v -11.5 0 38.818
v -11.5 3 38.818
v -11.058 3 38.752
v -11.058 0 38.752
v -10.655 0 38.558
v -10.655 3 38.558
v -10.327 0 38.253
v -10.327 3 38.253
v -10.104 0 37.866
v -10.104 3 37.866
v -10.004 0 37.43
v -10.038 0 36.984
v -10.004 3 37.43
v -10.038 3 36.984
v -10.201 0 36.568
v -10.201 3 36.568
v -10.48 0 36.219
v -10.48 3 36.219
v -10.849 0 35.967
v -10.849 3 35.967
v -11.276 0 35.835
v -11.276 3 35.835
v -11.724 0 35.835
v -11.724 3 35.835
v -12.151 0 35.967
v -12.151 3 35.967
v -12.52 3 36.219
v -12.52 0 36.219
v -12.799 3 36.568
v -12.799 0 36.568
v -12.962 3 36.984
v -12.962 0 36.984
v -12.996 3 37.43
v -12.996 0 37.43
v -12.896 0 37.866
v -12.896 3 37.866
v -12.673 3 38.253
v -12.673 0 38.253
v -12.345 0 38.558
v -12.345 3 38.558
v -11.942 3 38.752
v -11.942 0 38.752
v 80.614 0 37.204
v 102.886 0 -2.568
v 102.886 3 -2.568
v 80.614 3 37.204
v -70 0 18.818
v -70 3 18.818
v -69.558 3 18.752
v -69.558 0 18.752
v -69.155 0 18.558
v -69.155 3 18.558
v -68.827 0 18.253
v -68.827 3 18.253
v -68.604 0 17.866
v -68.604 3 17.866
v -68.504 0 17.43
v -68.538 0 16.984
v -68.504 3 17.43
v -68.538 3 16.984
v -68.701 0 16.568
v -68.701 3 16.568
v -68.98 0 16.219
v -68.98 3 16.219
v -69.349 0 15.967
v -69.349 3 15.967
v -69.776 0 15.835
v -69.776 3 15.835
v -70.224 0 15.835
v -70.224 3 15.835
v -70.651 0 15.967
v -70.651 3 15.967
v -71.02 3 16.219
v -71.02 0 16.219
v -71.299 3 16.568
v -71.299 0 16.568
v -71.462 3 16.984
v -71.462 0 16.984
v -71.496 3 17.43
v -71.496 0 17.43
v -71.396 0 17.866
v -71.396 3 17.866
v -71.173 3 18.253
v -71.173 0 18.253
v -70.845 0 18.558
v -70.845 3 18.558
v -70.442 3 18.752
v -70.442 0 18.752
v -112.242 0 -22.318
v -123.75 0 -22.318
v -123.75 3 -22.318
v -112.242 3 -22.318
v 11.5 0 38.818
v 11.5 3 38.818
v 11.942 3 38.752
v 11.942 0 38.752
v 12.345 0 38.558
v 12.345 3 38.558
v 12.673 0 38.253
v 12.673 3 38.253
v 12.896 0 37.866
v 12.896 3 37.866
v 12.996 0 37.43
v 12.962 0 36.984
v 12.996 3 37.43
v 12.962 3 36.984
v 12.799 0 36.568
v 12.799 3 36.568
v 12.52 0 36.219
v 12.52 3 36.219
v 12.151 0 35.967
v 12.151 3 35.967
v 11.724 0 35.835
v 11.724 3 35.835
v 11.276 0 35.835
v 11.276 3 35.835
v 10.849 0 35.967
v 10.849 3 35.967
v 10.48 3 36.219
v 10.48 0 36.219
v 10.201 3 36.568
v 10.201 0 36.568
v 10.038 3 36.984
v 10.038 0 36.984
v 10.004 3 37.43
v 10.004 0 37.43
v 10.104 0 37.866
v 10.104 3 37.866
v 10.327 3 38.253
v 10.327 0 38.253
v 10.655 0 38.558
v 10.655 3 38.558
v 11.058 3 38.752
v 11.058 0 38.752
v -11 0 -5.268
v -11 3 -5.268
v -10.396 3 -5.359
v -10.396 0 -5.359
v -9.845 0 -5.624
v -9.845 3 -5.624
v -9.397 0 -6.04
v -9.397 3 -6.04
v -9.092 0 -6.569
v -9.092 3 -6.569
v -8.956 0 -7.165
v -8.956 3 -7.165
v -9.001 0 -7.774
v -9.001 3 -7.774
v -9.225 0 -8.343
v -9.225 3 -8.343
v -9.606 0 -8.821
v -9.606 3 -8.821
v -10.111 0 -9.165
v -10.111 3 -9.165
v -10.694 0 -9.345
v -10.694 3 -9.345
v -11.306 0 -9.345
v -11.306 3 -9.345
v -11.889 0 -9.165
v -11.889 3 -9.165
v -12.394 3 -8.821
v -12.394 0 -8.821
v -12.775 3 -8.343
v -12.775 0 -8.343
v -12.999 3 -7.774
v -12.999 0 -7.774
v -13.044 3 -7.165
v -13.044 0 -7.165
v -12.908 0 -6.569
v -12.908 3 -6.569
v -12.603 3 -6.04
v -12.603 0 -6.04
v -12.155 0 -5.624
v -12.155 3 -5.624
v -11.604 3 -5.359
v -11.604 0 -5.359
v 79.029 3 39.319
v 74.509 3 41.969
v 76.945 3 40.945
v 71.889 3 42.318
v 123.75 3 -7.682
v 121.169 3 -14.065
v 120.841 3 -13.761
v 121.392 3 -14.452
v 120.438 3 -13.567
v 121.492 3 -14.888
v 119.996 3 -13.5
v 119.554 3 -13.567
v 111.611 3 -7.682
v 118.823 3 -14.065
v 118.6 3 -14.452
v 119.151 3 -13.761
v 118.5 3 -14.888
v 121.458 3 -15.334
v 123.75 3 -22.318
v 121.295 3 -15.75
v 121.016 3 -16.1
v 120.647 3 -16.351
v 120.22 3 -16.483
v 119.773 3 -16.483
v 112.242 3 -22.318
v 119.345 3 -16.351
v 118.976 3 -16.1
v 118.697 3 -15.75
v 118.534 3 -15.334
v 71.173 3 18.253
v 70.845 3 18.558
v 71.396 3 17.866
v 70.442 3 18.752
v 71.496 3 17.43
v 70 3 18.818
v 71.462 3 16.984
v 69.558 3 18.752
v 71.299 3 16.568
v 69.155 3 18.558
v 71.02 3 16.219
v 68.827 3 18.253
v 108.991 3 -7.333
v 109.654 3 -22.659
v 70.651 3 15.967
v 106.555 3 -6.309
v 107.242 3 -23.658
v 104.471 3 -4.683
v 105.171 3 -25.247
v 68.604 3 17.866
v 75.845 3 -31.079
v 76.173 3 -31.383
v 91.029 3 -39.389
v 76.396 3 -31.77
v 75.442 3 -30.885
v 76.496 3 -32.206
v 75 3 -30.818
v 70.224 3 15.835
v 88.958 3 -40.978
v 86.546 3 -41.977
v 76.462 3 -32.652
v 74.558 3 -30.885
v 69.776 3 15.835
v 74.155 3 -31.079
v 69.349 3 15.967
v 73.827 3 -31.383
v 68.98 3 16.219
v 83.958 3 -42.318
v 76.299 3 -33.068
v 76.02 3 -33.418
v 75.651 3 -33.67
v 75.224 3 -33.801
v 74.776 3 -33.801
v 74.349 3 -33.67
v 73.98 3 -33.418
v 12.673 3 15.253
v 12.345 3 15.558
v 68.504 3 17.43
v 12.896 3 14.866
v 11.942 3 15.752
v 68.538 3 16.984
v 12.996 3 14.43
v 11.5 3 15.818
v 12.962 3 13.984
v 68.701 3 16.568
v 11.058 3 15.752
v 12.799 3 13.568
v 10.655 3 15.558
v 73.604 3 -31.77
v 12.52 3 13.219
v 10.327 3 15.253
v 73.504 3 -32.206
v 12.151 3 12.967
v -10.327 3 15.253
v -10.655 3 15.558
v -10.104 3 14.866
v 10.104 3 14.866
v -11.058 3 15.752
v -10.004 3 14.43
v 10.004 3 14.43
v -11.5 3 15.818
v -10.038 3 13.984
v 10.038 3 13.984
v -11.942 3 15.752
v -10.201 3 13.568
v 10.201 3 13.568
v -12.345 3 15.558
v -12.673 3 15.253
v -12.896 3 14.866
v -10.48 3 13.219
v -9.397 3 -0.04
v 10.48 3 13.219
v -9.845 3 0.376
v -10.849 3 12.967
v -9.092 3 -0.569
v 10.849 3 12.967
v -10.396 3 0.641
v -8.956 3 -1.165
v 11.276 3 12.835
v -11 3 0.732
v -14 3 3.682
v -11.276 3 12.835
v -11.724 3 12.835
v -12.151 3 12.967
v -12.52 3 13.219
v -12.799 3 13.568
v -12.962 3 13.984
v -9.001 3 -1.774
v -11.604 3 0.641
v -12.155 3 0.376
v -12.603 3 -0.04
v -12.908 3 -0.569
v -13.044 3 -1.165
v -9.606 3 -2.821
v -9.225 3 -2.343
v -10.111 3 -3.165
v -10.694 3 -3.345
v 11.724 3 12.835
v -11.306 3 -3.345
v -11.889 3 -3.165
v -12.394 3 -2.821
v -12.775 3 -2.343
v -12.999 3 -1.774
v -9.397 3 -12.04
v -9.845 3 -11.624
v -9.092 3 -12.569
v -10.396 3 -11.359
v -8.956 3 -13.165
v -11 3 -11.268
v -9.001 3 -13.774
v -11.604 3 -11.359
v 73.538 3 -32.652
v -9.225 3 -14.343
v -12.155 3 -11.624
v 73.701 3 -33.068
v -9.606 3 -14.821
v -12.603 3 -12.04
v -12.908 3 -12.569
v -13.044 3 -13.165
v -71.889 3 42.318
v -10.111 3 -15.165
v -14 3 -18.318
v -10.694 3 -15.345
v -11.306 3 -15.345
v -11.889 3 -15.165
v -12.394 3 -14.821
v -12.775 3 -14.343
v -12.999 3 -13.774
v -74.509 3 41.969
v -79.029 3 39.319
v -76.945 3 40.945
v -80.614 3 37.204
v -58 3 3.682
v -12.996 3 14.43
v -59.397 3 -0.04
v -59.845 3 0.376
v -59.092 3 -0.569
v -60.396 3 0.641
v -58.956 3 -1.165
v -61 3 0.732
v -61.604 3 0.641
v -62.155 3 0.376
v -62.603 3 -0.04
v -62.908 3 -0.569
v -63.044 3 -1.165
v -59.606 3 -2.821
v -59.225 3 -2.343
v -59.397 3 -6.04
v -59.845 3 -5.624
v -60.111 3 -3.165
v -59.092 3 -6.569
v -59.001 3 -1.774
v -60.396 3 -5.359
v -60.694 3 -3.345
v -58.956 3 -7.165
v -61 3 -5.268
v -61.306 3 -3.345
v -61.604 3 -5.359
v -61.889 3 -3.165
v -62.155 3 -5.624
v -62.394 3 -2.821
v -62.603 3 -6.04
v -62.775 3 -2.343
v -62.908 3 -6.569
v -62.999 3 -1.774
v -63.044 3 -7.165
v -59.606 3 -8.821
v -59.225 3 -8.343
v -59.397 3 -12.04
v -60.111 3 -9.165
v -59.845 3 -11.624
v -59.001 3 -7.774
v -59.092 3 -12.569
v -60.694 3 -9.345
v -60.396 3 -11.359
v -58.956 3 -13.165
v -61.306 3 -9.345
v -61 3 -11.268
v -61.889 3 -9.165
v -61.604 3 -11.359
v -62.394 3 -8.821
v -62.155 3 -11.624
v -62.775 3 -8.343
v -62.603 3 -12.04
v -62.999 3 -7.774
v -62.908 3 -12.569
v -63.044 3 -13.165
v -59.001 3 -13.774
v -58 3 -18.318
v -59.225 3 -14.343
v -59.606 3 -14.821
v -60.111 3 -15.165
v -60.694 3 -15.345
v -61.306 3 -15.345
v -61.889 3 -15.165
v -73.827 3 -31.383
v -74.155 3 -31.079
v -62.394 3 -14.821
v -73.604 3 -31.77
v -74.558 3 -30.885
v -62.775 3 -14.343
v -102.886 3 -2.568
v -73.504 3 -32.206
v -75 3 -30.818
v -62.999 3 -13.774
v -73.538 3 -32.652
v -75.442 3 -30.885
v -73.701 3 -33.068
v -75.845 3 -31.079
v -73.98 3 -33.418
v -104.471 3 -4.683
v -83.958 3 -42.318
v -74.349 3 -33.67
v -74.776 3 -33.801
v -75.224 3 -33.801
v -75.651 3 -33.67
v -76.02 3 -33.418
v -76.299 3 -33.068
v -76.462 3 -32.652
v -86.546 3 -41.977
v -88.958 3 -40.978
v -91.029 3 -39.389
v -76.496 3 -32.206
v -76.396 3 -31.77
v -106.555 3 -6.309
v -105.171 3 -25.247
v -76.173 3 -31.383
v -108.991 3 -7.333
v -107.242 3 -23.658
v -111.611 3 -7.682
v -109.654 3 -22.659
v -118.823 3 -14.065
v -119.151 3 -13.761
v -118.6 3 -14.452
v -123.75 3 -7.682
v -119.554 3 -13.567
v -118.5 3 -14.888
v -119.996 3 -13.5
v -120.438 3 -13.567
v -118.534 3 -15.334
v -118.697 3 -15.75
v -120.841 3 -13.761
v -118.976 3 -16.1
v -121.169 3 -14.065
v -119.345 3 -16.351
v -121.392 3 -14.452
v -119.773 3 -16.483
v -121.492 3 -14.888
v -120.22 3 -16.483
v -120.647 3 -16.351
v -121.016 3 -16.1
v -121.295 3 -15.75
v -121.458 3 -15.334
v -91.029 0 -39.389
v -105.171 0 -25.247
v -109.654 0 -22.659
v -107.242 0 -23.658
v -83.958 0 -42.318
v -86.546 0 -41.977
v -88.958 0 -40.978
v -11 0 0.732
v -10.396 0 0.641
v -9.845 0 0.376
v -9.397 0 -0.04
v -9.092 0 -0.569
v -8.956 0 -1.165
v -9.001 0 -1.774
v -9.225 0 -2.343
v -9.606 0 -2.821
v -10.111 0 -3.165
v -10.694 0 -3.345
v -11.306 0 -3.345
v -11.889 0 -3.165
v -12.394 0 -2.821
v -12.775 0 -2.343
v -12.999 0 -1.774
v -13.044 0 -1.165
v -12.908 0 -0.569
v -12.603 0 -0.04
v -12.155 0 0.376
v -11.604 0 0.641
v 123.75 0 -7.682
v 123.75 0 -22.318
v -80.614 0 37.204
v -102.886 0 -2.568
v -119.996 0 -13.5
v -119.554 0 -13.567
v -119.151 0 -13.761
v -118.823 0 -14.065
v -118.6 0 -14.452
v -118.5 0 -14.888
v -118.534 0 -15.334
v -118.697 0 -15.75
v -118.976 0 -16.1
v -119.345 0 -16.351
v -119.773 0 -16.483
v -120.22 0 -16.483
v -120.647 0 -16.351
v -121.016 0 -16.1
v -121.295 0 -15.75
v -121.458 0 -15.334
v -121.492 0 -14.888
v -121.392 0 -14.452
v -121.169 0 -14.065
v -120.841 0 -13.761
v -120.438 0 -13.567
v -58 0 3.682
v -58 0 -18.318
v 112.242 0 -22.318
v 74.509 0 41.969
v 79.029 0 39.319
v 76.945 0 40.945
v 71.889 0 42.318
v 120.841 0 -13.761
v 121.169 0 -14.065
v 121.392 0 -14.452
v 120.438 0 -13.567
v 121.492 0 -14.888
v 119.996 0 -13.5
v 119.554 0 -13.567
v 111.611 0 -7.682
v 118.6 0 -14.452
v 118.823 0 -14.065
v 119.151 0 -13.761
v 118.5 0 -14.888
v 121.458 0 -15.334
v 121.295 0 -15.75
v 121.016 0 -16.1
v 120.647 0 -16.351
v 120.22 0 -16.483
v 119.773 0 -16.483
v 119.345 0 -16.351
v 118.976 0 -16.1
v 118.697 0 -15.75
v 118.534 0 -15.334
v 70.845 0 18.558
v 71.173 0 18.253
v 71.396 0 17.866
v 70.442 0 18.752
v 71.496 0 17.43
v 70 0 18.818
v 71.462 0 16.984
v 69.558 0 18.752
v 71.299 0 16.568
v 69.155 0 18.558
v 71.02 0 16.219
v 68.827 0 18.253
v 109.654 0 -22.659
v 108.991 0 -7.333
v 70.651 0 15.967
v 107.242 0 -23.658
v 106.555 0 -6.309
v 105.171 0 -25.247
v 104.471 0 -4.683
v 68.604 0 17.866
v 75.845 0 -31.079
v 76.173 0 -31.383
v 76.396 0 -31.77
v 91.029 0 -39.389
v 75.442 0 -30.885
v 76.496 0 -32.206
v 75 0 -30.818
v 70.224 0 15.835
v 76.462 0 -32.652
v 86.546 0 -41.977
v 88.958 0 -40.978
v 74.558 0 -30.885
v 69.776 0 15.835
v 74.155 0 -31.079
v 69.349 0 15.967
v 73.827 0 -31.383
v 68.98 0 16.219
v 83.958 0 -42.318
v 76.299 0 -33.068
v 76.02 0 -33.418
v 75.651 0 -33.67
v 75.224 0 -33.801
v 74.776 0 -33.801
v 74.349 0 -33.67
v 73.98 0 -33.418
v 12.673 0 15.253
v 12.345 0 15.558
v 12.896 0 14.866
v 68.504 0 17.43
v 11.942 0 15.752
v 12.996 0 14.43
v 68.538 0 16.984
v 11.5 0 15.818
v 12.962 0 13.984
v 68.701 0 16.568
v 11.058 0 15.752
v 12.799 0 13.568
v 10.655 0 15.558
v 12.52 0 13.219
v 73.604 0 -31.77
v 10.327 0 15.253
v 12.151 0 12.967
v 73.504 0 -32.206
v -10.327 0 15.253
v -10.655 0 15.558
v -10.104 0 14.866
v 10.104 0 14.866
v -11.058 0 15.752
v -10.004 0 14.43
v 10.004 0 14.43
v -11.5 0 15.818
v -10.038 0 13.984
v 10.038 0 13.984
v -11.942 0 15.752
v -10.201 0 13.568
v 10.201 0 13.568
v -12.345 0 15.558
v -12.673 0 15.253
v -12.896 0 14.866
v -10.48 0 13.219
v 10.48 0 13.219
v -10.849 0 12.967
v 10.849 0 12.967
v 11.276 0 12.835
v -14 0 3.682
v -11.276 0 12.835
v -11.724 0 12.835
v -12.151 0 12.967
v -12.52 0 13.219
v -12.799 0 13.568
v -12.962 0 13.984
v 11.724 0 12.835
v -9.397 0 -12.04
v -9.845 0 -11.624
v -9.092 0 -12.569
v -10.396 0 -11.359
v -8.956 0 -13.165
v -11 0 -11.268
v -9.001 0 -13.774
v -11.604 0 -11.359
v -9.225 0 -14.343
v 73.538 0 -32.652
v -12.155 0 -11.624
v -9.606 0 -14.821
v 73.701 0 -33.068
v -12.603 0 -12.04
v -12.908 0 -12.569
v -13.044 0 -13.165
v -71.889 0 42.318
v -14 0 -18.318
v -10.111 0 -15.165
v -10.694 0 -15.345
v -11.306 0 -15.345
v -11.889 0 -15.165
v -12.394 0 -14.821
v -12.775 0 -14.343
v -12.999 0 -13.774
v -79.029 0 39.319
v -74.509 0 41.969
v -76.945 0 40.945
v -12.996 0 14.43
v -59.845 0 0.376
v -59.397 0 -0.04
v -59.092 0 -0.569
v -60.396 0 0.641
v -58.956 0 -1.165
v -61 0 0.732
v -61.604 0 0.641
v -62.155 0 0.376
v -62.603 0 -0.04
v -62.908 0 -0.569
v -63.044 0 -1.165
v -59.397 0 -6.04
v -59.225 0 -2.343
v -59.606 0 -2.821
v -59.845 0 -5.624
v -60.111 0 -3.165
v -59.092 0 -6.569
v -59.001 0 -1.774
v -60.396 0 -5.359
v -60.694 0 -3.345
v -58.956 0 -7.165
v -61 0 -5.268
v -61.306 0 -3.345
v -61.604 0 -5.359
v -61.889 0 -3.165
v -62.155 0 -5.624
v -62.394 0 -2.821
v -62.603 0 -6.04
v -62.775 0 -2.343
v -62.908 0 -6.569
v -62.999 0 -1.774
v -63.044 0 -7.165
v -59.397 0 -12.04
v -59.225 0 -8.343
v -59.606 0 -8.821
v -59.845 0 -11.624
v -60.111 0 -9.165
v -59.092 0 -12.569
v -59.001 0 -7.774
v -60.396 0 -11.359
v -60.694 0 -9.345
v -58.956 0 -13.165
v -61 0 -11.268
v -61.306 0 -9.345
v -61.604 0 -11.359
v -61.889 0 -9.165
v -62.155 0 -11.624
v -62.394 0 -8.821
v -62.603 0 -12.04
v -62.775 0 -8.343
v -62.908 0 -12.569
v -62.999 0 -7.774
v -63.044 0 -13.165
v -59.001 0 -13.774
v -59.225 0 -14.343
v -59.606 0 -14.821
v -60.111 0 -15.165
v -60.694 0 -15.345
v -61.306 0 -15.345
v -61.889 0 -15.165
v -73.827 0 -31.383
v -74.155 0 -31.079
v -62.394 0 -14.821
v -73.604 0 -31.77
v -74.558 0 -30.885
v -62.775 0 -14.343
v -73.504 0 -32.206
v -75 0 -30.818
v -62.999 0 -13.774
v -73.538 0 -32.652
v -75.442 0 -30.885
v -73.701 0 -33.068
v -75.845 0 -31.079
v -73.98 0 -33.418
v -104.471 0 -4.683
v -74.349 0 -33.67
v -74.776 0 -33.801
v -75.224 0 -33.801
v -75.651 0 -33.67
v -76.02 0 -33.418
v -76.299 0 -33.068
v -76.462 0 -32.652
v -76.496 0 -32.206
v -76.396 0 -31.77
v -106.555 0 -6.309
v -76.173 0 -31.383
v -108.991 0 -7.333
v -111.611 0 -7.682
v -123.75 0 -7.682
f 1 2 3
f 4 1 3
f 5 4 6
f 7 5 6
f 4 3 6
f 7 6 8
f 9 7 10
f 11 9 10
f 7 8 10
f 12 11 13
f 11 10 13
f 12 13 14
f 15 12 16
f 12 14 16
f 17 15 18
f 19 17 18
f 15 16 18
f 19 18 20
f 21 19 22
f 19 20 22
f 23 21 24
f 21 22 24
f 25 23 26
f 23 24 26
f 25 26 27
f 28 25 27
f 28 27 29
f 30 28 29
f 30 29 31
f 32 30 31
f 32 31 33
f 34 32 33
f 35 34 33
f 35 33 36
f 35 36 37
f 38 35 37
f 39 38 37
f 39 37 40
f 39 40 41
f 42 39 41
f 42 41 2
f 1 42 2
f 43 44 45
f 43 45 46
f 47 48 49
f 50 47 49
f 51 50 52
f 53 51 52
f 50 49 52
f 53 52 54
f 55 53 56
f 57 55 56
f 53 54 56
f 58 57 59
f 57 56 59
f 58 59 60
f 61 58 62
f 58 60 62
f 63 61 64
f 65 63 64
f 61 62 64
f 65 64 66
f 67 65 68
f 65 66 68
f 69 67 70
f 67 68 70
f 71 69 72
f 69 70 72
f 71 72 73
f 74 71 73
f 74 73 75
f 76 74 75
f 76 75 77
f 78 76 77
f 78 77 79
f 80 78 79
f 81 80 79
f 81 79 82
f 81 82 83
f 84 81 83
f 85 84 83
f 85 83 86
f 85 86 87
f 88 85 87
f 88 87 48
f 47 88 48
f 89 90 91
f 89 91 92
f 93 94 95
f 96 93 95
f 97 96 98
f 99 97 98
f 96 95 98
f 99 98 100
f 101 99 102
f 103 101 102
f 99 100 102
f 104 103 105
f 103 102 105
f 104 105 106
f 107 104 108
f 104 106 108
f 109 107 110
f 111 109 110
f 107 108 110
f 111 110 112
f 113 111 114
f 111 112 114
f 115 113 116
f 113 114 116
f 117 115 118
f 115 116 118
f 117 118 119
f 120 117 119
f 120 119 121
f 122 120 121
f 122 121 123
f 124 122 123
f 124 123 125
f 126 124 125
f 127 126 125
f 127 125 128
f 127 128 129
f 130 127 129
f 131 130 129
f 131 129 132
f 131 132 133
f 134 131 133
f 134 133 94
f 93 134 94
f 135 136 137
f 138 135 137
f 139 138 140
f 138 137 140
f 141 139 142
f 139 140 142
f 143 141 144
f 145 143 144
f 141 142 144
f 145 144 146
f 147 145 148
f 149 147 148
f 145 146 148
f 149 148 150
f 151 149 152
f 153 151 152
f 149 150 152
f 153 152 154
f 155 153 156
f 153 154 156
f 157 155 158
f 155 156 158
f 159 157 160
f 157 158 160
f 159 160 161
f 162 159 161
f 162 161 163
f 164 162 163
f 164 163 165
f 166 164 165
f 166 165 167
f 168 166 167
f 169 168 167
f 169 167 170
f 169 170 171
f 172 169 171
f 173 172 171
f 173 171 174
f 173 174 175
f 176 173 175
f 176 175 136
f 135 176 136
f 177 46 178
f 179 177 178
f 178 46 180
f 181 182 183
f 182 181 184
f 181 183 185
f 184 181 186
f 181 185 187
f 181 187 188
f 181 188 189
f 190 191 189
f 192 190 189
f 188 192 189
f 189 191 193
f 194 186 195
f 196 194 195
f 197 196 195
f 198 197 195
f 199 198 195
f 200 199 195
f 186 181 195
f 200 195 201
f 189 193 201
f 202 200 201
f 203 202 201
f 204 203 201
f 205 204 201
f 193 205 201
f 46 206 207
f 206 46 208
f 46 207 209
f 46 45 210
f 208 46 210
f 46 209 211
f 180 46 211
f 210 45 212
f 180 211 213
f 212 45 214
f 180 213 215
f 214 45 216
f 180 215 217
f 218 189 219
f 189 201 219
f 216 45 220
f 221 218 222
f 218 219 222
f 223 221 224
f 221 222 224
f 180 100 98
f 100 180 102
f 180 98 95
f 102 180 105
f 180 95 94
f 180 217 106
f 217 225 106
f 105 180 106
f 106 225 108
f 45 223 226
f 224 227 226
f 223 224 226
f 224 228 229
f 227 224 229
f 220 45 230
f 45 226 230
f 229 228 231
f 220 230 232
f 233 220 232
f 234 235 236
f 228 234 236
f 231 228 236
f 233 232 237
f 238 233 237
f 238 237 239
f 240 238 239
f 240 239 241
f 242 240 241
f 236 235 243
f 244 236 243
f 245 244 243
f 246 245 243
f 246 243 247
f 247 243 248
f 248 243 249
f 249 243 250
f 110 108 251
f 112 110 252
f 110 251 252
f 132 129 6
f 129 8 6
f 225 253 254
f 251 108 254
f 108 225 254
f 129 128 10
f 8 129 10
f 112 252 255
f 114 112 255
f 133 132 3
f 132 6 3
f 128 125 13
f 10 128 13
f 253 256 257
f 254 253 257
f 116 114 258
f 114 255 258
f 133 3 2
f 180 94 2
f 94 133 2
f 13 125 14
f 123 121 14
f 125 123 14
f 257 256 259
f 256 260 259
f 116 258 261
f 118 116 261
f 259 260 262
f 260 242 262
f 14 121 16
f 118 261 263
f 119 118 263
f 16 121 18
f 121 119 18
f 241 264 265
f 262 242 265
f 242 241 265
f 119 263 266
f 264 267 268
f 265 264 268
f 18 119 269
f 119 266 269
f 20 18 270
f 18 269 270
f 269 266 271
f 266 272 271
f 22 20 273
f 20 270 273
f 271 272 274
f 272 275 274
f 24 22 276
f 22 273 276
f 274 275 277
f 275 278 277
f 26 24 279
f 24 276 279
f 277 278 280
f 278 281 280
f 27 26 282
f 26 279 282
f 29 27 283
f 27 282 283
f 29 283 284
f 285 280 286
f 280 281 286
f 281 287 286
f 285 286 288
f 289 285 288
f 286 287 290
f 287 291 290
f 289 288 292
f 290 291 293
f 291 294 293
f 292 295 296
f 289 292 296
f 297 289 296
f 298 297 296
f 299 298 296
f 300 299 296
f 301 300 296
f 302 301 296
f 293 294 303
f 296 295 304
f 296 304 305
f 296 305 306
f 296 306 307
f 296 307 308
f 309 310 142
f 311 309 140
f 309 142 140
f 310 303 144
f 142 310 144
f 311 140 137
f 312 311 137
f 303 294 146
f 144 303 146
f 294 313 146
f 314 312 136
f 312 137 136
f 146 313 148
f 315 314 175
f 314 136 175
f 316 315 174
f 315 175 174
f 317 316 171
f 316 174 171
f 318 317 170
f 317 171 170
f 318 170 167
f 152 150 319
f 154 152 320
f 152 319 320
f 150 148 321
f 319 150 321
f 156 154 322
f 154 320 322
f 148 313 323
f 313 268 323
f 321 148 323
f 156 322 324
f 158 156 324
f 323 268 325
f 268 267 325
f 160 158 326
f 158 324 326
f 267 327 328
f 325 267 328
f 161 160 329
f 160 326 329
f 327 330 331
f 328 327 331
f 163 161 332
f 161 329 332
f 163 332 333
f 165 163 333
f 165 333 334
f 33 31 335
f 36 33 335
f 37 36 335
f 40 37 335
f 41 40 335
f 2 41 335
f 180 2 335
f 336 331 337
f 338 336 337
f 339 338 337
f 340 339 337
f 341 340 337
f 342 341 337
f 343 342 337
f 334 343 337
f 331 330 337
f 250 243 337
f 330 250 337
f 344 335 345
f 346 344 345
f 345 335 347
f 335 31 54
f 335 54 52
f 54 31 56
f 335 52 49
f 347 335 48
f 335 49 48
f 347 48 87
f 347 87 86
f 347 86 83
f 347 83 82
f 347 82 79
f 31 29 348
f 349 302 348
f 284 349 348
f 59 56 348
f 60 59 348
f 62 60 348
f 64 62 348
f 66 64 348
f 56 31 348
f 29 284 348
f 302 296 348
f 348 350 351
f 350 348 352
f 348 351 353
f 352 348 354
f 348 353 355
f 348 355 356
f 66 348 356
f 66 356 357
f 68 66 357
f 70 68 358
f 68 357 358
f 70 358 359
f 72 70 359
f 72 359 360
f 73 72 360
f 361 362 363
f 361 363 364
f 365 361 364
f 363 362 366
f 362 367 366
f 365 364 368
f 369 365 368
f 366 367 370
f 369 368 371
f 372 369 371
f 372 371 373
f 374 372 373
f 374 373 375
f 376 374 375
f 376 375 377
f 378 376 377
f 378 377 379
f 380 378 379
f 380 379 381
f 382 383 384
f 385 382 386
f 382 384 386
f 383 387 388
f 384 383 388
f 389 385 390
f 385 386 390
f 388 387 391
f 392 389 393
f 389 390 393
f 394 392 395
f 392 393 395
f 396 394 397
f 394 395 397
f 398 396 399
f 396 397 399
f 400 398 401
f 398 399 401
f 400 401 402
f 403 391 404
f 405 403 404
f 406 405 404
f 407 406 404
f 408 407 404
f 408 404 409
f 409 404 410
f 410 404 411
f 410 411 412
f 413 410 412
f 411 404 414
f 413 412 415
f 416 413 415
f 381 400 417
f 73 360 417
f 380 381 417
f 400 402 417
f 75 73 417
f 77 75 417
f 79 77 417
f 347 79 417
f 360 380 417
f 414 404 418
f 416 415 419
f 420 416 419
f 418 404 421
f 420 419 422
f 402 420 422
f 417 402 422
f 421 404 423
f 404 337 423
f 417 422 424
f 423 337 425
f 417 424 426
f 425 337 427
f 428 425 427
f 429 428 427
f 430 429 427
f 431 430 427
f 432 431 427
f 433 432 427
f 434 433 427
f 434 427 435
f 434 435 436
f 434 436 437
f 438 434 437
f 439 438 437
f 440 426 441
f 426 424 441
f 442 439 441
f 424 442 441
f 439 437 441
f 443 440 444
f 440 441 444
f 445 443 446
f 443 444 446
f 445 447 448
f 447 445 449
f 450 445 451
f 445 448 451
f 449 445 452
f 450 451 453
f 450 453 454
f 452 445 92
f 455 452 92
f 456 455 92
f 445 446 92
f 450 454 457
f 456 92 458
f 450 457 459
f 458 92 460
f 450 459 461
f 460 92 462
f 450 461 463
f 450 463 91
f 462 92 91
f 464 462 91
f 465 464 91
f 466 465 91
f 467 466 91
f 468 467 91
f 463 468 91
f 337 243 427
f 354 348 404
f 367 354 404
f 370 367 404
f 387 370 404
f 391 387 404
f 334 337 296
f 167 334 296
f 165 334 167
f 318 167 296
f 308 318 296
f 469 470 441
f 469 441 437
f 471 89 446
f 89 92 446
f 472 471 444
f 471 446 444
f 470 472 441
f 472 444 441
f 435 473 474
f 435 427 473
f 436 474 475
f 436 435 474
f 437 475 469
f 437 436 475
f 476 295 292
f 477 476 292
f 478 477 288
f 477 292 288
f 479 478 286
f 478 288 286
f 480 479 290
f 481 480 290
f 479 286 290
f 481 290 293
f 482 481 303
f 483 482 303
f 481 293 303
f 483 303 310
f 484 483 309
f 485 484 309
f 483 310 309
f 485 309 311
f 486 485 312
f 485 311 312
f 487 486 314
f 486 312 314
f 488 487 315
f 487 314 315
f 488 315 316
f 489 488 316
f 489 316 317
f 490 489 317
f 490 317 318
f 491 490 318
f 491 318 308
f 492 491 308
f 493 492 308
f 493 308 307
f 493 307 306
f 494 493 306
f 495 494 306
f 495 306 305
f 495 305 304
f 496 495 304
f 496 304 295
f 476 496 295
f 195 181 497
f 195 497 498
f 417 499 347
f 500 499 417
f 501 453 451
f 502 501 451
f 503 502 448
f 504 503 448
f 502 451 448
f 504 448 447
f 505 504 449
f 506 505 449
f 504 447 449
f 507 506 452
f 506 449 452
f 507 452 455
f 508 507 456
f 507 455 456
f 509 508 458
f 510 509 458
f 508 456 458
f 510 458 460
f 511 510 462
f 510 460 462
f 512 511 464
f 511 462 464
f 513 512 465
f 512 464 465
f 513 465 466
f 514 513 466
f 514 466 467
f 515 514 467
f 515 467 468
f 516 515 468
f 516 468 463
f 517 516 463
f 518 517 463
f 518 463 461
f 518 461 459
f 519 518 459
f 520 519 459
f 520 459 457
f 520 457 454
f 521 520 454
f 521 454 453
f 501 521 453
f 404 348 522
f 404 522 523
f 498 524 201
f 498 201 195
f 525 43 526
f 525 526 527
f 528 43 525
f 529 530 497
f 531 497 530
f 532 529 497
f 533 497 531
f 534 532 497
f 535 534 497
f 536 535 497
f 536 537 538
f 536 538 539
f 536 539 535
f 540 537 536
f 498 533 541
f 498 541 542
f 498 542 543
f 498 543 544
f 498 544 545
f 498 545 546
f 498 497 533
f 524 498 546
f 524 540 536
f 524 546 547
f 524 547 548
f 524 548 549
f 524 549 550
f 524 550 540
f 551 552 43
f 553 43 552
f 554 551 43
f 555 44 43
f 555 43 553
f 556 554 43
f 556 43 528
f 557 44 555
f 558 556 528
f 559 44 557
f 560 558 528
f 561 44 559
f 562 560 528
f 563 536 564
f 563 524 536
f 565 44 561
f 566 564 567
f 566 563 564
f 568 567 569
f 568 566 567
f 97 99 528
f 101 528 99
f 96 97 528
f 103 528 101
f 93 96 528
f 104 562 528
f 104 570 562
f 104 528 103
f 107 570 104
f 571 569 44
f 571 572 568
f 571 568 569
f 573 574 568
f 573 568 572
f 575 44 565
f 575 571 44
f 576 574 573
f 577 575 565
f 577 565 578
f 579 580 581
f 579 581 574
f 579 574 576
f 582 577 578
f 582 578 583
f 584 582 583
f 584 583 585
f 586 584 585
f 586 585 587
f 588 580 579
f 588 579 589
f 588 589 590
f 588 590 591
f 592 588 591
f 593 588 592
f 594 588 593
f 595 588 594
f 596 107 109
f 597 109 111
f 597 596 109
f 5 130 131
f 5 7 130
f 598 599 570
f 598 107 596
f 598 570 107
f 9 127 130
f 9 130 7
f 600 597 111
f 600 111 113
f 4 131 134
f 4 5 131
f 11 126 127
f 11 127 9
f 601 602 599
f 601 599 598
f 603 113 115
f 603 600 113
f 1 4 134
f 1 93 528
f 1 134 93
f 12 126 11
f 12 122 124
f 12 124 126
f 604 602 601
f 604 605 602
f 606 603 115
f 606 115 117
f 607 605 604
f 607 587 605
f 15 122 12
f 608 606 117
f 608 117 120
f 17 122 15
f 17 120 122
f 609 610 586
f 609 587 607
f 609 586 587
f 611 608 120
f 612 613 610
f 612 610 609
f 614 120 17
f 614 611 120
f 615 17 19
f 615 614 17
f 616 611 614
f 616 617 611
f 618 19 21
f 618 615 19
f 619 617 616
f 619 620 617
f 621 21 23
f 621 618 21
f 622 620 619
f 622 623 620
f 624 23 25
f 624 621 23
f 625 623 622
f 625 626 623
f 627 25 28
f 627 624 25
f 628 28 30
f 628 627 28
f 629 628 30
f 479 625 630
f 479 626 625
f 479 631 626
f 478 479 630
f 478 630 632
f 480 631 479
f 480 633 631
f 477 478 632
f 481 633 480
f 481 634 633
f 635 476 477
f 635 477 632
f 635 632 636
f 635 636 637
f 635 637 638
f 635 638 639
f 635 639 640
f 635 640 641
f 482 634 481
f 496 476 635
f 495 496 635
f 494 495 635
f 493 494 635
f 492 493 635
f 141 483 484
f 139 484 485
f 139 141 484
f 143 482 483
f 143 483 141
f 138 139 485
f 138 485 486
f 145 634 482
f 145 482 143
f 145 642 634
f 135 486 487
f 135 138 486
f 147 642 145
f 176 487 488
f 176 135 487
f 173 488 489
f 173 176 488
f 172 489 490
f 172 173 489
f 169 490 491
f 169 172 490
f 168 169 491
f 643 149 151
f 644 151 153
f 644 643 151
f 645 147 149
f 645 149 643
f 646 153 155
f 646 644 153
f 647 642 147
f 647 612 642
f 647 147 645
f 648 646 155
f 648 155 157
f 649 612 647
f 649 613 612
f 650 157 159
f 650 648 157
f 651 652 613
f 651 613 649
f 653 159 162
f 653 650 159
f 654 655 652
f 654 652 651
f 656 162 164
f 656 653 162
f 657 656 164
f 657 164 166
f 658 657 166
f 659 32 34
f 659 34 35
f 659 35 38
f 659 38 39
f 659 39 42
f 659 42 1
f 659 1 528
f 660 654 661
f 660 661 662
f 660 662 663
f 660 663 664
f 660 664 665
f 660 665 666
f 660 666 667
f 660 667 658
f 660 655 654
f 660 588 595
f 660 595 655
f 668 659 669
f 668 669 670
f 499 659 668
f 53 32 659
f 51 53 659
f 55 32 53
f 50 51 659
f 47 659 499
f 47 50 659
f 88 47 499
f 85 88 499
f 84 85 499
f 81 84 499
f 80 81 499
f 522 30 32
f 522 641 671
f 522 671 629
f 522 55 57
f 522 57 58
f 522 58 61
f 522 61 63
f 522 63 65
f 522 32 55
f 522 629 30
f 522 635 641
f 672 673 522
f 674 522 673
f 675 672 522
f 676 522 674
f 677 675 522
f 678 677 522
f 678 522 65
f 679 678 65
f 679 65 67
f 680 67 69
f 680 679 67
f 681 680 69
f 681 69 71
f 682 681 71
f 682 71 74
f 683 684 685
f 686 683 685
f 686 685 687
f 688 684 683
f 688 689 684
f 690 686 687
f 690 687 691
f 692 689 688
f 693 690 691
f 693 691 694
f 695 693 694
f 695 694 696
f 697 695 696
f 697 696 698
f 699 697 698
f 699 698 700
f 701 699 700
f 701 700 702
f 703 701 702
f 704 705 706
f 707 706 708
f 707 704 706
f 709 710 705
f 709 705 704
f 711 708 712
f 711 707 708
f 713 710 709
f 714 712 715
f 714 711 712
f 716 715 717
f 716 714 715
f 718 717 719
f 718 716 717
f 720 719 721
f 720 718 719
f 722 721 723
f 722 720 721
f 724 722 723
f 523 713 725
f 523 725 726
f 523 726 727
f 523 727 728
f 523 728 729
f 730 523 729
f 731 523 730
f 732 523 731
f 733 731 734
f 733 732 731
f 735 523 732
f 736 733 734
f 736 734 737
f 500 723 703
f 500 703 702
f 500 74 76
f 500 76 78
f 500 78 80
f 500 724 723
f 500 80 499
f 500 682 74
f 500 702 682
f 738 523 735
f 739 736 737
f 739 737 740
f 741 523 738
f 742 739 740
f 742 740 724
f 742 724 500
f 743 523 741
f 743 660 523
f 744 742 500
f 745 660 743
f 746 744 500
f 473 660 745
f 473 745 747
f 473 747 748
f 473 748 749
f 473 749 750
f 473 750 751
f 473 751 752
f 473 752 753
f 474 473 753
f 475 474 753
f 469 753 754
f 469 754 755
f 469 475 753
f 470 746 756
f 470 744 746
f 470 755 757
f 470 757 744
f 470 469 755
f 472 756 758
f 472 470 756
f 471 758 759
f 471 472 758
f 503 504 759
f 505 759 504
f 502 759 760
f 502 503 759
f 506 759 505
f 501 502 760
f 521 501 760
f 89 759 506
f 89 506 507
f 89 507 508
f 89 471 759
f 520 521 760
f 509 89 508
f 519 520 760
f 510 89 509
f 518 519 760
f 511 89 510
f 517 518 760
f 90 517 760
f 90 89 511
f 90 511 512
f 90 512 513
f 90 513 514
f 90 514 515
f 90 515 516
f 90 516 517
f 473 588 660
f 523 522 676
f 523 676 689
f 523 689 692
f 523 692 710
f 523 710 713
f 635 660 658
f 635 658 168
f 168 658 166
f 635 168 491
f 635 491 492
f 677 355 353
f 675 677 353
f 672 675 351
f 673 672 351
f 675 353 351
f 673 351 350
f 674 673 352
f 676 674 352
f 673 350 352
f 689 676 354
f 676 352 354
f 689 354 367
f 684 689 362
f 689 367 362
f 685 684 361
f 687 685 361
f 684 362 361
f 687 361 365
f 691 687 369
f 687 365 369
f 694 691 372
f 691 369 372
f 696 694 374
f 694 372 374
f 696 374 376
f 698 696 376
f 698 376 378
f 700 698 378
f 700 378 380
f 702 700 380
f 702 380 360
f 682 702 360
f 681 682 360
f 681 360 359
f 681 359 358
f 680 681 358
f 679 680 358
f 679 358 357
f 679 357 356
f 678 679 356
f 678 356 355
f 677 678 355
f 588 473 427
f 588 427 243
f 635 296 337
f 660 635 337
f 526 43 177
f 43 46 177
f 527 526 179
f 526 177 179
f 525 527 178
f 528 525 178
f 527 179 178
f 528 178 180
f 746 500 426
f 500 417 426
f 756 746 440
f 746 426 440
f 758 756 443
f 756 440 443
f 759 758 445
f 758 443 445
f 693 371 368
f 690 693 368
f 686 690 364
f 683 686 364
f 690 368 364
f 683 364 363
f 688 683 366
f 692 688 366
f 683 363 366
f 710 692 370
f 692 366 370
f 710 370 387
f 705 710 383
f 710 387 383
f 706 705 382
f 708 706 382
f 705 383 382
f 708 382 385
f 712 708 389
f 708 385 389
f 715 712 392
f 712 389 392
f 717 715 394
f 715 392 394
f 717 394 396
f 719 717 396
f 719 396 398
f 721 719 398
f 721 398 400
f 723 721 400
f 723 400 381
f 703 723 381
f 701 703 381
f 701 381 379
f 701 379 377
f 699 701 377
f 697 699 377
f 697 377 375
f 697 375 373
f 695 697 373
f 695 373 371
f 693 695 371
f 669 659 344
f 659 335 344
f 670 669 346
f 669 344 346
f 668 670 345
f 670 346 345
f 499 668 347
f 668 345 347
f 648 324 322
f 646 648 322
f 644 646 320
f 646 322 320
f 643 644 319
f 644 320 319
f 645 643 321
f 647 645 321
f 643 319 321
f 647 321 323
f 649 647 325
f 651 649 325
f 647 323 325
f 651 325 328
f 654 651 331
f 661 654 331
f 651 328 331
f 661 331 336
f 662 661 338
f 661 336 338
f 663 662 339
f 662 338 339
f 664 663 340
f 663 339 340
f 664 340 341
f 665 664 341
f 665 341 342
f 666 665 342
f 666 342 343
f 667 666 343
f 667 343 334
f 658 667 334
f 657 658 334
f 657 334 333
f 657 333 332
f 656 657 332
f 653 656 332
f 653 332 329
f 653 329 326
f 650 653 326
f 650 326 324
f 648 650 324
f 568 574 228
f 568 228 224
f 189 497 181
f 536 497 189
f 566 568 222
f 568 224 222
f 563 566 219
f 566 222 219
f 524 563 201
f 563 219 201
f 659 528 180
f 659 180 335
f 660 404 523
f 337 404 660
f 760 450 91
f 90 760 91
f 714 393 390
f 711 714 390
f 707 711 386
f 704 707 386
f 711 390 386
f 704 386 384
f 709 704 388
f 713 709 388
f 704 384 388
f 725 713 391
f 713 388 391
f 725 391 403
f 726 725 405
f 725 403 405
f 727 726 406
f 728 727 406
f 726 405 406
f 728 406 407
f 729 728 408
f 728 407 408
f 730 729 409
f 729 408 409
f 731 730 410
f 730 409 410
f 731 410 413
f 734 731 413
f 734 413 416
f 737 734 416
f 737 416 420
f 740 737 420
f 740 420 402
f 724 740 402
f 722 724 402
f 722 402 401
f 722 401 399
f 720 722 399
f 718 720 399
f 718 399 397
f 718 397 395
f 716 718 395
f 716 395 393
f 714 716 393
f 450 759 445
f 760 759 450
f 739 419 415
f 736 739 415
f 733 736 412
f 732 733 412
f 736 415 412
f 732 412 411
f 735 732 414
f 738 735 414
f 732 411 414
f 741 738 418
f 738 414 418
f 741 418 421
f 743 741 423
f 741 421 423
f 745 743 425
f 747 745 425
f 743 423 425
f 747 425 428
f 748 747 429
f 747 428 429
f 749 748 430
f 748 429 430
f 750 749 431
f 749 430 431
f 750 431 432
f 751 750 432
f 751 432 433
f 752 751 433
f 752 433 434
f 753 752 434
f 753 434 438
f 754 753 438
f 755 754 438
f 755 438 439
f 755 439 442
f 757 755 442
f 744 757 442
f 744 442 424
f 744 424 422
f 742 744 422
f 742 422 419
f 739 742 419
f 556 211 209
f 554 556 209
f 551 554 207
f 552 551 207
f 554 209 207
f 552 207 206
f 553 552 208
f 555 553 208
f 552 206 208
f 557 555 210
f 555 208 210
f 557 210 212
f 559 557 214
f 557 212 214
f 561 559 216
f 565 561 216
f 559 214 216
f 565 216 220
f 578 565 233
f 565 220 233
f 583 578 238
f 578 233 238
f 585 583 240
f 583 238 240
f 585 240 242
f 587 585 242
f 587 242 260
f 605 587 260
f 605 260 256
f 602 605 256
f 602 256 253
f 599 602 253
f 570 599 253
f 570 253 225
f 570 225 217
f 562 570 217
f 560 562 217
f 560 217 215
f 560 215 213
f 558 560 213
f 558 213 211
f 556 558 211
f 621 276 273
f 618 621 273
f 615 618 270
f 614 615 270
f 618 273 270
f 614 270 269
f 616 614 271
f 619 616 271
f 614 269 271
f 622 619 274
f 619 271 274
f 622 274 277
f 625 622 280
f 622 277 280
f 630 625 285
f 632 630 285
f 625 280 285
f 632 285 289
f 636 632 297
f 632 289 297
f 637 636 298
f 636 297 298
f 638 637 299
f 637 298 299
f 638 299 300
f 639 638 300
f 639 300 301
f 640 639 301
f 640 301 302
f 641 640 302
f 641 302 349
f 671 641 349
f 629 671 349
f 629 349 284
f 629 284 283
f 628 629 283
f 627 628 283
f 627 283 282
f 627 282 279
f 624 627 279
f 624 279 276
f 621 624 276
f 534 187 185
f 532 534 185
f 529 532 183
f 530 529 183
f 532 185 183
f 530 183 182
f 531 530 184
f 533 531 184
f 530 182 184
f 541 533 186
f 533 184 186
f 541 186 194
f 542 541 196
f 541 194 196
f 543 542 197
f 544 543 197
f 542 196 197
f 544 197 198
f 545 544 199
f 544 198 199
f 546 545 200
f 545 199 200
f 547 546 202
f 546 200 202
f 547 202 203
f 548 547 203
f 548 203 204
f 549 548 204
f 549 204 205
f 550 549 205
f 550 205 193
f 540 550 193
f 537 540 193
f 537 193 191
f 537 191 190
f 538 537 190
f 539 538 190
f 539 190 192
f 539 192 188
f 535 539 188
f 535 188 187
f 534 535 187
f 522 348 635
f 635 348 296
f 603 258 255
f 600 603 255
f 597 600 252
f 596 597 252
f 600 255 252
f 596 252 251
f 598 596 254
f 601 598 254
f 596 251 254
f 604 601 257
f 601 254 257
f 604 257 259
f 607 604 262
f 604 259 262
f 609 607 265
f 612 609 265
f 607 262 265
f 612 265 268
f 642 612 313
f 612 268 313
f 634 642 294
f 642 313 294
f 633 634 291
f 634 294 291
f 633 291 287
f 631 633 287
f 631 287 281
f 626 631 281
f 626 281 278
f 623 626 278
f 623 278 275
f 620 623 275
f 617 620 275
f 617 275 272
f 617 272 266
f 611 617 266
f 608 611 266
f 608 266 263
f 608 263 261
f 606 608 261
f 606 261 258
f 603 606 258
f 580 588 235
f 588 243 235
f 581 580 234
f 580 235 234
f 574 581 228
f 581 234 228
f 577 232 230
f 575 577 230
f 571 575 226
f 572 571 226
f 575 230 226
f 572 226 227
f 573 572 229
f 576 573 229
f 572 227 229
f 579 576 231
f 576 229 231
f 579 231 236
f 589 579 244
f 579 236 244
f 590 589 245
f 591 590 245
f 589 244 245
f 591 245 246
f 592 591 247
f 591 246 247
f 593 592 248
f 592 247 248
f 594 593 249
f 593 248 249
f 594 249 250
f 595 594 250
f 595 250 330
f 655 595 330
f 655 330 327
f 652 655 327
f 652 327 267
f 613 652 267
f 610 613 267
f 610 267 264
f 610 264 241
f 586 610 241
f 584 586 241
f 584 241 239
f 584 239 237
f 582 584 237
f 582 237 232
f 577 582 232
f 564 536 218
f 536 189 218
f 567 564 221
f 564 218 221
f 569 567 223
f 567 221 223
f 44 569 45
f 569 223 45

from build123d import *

# Parameters (mm, degrees)
SALIENTE_EXTRUIR1_DEPTH = 3
REDONDEO1_R             = 10
CROQUIS2_R              = 1.5
CROQUIS2_R_2            = 2.05
CROQUIS2_W              = 42
CROQUIS2_H              = 20
CORTAR_EXTRUIR1_DEPTH   = 135.610141171
CROQUIS3_W              = 4
CROQUIS3_H              = 14.636342218
CORTAR_EXTRUIR2_DEPTH   = 135.610141171
CROQUIS4_W              = 44
CROQUIS4_H              = 22
CORTAR_EXTRUIR3_DEPTH   = 131.820067673


with BuildPart() as part:
    # Croquis1 → Saliente-Extruir1 (new body)
    with BuildSketch(Plane(origin=(0, 0, 0), x_dir=(1, 0, 0), z_dir=(0, 1, 0))):
        Polygon((-88.1, 42.318171109), (88.1, 42.318171109), (108.1, 22.318171109), (127.75, 22.318171109), (127.75, 7.681828891), (105.75, 7.681828891), (77.75, -42.318171109), (-77.75, -42.318171109), (-105.75, 7.681828891), (-127.75, 7.681828891), (-127.75, 22.318171109), (-108.1, 22.318171109), align=None)
    extrude(amount=SALIENTE_EXTRUIR1_DEPTH)

    # Redondeo1
    redondeo1_edges = [part.edges().sort_by_distance(p)[0] for p in [
        (-88.1, 1.5, -42.318171109),
        (88.1, 1.5, -42.318171109),
        (108.1, 1.5, -22.318171109),
        (105.75, 1.5, -7.681828891),
        (77.75, 1.5, 42.318171109),
        (-77.75, 1.5, 42.318171109),
        (-105.75, 1.5, -7.681828891),
        (-108.1, 1.5, -22.318171109),
    ]]
    fillet(redondeo1_edges, radius=REDONDEO1_R)

    # Croquis2 → Cortar-Extruir1 (cut, through all)
    with BuildSketch(Plane(origin=(0, 3, 0), x_dir=(1, 0, 0), z_dir=(0, 1, 0))):
        with Locations(Location((70, -17.318171109, 0), (0, 0, 270))):
            Circle(CROQUIS2_R)
        with Locations(Location((-70, -17.318171109, 0), (0, 0, 270))):
            Circle(CROQUIS2_R)
        with Locations(Location((-119.996067812, 15, 0), (0, 0, 270))):
            Circle(CROQUIS2_R)
        with Locations(Location((119.996067812, 15, 0), (0, 0, 270))):
            Circle(CROQUIS2_R)
        with Locations(Location((-75, 32.318171109, 0), (0, 0, 270))):
            Circle(CROQUIS2_R)
        with Locations(Location((75, 32.318171109, 0), (0, 0, 270))):
            Circle(CROQUIS2_R)
        with Locations(Location((-11.5, -14.318171109, 0), (0, 0, 270))):
            Circle(CROQUIS2_R)
        with Locations(Location((11.5, -14.318171109, 0), (0, 0, 270))):
            Circle(CROQUIS2_R)
        with Locations(Location((-11.5, -37.318171109, 0), (0, 0, 270))):
            Circle(CROQUIS2_R)
        with Locations(Location((11.5, -37.318171109, 0), (0, 0, 270))):
            Circle(CROQUIS2_R)
        with Locations(Location((-61, 7.318171109, 0), (0, 0, 270))):
            Circle(CROQUIS2_R_2)
        with Locations(Location((-11, 7.318171109, 0), (0, 0, 270))):
            Circle(CROQUIS2_R_2)
        with Locations(Location((-61, 13.318171109, 0), (0, 0, 270))):
            Circle(CROQUIS2_R_2)
        with Locations(Location((-61, 1.318171109, 0), (0, 0, 270))):
            Circle(CROQUIS2_R_2)
        with Locations(Location((-11, 13.318171109, 0), (0, 0, 270))):
            Circle(CROQUIS2_R_2)
        with Locations(Location((-11, 1.318171109, 0), (0, 0, 270))):
            Circle(CROQUIS2_R_2)
        with Locations((-36, 7.318171109)):
            Rectangle(CROQUIS2_W, CROQUIS2_H)
    extrude(amount=-CORTAR_EXTRUIR1_DEPTH, mode=Mode.SUBTRACT)

    # Croquis3 → Cortar-Extruir2 (cut, through all)
    with BuildSketch(Plane(origin=(0, 3, 0), x_dir=(1, 0, 0), z_dir=(0, 1, 0))):
        with Locations((-125.75, 15)):
            Rectangle(CROQUIS3_W, CROQUIS3_H)
        with Locations((125.75, 15)):
            Rectangle(CROQUIS3_W, CROQUIS3_H)
    extrude(amount=-CORTAR_EXTRUIR2_DEPTH, mode=Mode.SUBTRACT)

    # Croquis4 → Cortar-Extruir3 (cut, through all)
    with BuildSketch(Plane(origin=(0, 3, 0), x_dir=(1, 0, 0), z_dir=(0, 1, 0))):
        with Locations((-36, 7.318171109)):
            Rectangle(CROQUIS4_W, CROQUIS4_H)
    extrude(amount=-CORTAR_EXTRUIR3_DEPTH, mode=Mode.SUBTRACT)


solid = part.part
